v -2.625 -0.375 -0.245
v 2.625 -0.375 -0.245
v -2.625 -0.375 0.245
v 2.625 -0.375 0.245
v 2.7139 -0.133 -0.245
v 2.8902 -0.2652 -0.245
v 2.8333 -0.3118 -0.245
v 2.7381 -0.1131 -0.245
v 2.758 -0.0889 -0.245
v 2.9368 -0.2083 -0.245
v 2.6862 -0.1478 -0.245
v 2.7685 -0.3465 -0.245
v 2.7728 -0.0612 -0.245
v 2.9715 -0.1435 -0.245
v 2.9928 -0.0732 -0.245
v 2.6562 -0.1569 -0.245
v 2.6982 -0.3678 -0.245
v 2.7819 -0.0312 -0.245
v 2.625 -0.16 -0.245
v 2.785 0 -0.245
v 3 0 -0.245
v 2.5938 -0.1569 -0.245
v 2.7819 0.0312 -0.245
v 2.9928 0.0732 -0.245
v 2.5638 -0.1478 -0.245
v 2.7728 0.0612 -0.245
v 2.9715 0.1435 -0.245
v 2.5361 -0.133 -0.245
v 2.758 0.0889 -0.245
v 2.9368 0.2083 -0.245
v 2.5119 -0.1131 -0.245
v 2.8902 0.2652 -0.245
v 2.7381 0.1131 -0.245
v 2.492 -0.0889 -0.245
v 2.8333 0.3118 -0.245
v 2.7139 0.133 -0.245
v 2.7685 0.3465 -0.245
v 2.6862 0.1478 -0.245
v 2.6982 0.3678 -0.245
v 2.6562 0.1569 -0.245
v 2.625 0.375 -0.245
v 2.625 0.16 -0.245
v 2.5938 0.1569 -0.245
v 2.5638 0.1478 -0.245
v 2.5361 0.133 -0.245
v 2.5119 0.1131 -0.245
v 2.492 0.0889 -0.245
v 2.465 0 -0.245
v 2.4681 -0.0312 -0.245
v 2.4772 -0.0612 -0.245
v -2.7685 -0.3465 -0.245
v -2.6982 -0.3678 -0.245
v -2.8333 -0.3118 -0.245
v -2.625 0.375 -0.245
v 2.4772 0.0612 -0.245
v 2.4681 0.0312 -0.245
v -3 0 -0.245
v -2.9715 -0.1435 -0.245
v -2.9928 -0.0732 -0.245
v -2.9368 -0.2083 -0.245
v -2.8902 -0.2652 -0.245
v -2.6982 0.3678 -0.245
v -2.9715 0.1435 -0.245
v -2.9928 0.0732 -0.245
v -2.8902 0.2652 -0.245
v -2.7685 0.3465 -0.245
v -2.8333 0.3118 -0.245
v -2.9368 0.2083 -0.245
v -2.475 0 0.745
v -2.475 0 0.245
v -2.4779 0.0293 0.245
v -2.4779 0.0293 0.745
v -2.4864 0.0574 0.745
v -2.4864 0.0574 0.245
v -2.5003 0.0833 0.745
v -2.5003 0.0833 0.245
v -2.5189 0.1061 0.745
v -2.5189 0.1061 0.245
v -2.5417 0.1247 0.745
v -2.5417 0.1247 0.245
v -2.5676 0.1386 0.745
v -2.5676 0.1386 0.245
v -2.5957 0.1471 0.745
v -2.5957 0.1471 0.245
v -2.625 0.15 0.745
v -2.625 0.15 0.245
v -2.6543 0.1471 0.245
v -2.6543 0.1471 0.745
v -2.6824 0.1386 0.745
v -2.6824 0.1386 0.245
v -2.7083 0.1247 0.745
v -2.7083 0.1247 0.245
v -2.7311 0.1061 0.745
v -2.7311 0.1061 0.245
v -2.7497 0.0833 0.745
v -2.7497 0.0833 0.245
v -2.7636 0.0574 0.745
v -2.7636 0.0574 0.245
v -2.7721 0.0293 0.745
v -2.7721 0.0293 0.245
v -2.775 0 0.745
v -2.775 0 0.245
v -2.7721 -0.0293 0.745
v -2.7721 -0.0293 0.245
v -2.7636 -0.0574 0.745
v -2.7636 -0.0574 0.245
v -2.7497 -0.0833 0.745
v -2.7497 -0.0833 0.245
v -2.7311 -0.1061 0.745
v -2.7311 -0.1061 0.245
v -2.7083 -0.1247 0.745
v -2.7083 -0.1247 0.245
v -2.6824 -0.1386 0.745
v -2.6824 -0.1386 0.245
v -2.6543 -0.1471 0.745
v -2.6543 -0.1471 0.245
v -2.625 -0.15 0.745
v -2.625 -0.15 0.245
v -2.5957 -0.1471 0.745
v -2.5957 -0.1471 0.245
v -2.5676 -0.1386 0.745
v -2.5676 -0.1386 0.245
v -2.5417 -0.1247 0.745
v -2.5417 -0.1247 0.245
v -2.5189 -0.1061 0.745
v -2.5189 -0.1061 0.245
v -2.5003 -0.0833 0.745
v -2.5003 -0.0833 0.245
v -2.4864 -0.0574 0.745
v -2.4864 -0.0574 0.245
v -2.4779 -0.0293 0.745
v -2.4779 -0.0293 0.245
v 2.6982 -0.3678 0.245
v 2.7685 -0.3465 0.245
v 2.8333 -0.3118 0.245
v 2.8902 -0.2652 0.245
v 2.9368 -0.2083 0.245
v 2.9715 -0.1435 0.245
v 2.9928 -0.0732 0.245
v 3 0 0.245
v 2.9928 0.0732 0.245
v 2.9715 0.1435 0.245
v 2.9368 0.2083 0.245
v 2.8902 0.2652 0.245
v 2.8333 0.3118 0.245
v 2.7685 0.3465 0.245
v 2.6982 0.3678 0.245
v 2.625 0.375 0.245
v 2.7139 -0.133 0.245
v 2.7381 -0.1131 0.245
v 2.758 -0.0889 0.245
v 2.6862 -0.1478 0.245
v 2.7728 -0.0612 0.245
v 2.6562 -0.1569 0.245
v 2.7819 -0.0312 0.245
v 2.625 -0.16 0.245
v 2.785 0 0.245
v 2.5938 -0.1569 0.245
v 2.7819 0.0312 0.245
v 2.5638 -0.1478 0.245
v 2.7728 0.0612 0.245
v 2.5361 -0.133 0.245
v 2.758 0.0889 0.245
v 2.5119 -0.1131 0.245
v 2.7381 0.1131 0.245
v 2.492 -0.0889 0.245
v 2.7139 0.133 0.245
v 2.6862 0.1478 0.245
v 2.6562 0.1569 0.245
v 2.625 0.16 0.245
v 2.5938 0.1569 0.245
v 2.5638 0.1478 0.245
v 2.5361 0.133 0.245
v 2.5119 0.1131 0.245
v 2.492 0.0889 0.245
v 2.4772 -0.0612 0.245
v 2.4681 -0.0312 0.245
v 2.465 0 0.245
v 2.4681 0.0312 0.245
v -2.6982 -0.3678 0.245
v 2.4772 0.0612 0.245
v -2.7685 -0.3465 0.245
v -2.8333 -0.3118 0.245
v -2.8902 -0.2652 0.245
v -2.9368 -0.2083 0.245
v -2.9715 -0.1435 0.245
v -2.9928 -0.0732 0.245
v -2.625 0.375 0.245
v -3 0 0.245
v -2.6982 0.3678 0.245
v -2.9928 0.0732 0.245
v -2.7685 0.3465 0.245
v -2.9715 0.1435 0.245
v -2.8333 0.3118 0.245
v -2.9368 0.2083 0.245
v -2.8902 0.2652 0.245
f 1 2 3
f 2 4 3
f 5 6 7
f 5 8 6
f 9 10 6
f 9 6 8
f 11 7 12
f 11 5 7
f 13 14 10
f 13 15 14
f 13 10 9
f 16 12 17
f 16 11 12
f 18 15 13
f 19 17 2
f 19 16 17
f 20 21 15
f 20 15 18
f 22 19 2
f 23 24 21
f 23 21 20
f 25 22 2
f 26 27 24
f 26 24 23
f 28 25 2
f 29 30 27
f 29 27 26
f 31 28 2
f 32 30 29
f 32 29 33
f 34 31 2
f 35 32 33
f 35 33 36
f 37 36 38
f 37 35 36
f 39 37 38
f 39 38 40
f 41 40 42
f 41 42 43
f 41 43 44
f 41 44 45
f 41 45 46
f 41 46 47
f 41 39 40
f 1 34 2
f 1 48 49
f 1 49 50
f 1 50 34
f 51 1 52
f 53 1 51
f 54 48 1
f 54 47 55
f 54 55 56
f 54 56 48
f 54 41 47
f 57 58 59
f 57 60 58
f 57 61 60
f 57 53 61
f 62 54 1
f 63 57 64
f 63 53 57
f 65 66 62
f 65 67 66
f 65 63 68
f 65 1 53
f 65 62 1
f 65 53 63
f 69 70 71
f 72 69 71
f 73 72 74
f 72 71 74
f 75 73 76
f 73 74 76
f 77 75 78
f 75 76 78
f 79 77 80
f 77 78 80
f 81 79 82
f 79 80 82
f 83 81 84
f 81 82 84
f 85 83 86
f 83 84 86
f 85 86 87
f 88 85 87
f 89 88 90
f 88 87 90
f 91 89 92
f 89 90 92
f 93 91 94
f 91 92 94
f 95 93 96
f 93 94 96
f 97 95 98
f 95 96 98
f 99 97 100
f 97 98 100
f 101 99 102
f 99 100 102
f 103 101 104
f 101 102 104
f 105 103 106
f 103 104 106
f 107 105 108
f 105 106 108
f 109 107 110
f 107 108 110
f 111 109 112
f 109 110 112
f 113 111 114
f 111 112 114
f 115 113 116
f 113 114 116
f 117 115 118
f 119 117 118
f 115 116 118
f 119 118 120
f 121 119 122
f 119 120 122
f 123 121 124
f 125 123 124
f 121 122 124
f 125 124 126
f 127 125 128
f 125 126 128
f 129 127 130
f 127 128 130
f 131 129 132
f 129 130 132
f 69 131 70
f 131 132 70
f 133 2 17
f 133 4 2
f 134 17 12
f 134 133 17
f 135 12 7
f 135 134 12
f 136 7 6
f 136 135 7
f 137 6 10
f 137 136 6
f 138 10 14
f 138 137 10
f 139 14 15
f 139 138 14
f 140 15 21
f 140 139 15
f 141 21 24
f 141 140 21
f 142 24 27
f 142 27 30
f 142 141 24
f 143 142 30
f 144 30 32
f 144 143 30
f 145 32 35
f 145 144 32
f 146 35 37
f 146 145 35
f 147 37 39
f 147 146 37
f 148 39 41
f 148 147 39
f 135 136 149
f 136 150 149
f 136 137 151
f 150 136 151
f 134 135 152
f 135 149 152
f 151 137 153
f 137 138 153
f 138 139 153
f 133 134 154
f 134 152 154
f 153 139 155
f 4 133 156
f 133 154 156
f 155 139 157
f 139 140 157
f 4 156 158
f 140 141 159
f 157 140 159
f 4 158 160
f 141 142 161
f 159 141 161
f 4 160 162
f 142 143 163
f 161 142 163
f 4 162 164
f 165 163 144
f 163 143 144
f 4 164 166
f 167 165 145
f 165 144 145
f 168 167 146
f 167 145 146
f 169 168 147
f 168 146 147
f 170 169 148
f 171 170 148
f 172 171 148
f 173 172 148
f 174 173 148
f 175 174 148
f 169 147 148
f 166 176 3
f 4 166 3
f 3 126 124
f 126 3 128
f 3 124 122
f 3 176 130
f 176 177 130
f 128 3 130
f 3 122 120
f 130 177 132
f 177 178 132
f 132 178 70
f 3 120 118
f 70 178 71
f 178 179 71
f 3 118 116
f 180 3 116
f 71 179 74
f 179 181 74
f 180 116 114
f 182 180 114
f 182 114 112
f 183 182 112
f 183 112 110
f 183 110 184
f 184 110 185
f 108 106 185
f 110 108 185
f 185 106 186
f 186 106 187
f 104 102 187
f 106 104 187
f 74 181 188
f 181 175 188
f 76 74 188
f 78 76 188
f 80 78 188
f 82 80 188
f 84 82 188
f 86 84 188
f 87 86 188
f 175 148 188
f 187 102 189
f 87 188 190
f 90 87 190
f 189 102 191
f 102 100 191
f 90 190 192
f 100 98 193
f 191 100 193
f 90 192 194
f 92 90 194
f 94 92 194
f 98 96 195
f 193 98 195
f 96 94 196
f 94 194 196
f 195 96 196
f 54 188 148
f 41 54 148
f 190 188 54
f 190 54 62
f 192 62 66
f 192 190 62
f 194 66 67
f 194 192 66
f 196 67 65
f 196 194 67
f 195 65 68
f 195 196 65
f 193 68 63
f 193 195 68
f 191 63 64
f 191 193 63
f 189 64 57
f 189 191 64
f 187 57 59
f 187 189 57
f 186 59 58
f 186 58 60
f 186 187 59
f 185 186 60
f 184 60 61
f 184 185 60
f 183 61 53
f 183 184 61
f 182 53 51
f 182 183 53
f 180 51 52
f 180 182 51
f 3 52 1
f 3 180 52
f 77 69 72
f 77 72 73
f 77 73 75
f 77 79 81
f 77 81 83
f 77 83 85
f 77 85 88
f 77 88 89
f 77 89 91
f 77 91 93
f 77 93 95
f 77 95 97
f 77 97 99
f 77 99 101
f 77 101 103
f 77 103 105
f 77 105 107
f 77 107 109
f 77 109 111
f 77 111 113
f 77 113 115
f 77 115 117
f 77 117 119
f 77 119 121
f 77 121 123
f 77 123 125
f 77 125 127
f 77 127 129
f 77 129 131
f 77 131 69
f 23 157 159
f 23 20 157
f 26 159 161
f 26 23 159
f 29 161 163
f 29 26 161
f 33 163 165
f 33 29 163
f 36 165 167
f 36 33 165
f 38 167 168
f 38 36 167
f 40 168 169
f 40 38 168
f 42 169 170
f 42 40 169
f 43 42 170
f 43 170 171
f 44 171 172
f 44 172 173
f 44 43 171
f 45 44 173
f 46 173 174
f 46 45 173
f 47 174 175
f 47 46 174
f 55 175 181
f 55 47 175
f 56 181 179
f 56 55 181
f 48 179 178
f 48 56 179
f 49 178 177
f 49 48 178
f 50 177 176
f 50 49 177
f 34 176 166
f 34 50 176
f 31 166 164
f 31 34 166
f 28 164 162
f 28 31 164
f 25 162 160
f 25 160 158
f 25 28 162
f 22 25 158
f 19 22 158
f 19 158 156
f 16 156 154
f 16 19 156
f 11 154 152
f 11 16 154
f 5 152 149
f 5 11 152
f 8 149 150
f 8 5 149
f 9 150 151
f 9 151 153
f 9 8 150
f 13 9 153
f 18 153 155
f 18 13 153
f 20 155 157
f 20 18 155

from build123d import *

# Parameters (mm, degrees)
SKETCH_R     = 0.16
PAD_DEPTH    = 0.245
SKETCH001_R  = 0.15
PAD001_DEPTH = 0.5


with BuildPart() as part:
    # Sketch → Pad (new body, symmetric)
    with BuildSketch(Plane.XY):
        with BuildLine():
            Line((-2.625, 0.375), (2.625, 0.375))
            ThreePointArc((2.625, -0.375), (3, 0), (2.625, 0.375))
            Line((2.625, -0.375), (-2.625, -0.375))
            ThreePointArc((-2.625, 0.375), (-3, 0), (-2.625, -0.375))
        make_face()
        with Locations((2.625, 0)):
            Circle(SKETCH_R, mode=Mode.SUBTRACT)
    extrude(amount=PAD_DEPTH, both=True)

    # Sketch001 (on DatumPlane) → Pad001 (join)
    with BuildSketch(Plane.XY.offset(0.245)):
        with Locations((-2.625, 0)):
            Circle(SKETCH001_R)
    extrude(amount=PAD001_DEPTH)


solid = part.part
